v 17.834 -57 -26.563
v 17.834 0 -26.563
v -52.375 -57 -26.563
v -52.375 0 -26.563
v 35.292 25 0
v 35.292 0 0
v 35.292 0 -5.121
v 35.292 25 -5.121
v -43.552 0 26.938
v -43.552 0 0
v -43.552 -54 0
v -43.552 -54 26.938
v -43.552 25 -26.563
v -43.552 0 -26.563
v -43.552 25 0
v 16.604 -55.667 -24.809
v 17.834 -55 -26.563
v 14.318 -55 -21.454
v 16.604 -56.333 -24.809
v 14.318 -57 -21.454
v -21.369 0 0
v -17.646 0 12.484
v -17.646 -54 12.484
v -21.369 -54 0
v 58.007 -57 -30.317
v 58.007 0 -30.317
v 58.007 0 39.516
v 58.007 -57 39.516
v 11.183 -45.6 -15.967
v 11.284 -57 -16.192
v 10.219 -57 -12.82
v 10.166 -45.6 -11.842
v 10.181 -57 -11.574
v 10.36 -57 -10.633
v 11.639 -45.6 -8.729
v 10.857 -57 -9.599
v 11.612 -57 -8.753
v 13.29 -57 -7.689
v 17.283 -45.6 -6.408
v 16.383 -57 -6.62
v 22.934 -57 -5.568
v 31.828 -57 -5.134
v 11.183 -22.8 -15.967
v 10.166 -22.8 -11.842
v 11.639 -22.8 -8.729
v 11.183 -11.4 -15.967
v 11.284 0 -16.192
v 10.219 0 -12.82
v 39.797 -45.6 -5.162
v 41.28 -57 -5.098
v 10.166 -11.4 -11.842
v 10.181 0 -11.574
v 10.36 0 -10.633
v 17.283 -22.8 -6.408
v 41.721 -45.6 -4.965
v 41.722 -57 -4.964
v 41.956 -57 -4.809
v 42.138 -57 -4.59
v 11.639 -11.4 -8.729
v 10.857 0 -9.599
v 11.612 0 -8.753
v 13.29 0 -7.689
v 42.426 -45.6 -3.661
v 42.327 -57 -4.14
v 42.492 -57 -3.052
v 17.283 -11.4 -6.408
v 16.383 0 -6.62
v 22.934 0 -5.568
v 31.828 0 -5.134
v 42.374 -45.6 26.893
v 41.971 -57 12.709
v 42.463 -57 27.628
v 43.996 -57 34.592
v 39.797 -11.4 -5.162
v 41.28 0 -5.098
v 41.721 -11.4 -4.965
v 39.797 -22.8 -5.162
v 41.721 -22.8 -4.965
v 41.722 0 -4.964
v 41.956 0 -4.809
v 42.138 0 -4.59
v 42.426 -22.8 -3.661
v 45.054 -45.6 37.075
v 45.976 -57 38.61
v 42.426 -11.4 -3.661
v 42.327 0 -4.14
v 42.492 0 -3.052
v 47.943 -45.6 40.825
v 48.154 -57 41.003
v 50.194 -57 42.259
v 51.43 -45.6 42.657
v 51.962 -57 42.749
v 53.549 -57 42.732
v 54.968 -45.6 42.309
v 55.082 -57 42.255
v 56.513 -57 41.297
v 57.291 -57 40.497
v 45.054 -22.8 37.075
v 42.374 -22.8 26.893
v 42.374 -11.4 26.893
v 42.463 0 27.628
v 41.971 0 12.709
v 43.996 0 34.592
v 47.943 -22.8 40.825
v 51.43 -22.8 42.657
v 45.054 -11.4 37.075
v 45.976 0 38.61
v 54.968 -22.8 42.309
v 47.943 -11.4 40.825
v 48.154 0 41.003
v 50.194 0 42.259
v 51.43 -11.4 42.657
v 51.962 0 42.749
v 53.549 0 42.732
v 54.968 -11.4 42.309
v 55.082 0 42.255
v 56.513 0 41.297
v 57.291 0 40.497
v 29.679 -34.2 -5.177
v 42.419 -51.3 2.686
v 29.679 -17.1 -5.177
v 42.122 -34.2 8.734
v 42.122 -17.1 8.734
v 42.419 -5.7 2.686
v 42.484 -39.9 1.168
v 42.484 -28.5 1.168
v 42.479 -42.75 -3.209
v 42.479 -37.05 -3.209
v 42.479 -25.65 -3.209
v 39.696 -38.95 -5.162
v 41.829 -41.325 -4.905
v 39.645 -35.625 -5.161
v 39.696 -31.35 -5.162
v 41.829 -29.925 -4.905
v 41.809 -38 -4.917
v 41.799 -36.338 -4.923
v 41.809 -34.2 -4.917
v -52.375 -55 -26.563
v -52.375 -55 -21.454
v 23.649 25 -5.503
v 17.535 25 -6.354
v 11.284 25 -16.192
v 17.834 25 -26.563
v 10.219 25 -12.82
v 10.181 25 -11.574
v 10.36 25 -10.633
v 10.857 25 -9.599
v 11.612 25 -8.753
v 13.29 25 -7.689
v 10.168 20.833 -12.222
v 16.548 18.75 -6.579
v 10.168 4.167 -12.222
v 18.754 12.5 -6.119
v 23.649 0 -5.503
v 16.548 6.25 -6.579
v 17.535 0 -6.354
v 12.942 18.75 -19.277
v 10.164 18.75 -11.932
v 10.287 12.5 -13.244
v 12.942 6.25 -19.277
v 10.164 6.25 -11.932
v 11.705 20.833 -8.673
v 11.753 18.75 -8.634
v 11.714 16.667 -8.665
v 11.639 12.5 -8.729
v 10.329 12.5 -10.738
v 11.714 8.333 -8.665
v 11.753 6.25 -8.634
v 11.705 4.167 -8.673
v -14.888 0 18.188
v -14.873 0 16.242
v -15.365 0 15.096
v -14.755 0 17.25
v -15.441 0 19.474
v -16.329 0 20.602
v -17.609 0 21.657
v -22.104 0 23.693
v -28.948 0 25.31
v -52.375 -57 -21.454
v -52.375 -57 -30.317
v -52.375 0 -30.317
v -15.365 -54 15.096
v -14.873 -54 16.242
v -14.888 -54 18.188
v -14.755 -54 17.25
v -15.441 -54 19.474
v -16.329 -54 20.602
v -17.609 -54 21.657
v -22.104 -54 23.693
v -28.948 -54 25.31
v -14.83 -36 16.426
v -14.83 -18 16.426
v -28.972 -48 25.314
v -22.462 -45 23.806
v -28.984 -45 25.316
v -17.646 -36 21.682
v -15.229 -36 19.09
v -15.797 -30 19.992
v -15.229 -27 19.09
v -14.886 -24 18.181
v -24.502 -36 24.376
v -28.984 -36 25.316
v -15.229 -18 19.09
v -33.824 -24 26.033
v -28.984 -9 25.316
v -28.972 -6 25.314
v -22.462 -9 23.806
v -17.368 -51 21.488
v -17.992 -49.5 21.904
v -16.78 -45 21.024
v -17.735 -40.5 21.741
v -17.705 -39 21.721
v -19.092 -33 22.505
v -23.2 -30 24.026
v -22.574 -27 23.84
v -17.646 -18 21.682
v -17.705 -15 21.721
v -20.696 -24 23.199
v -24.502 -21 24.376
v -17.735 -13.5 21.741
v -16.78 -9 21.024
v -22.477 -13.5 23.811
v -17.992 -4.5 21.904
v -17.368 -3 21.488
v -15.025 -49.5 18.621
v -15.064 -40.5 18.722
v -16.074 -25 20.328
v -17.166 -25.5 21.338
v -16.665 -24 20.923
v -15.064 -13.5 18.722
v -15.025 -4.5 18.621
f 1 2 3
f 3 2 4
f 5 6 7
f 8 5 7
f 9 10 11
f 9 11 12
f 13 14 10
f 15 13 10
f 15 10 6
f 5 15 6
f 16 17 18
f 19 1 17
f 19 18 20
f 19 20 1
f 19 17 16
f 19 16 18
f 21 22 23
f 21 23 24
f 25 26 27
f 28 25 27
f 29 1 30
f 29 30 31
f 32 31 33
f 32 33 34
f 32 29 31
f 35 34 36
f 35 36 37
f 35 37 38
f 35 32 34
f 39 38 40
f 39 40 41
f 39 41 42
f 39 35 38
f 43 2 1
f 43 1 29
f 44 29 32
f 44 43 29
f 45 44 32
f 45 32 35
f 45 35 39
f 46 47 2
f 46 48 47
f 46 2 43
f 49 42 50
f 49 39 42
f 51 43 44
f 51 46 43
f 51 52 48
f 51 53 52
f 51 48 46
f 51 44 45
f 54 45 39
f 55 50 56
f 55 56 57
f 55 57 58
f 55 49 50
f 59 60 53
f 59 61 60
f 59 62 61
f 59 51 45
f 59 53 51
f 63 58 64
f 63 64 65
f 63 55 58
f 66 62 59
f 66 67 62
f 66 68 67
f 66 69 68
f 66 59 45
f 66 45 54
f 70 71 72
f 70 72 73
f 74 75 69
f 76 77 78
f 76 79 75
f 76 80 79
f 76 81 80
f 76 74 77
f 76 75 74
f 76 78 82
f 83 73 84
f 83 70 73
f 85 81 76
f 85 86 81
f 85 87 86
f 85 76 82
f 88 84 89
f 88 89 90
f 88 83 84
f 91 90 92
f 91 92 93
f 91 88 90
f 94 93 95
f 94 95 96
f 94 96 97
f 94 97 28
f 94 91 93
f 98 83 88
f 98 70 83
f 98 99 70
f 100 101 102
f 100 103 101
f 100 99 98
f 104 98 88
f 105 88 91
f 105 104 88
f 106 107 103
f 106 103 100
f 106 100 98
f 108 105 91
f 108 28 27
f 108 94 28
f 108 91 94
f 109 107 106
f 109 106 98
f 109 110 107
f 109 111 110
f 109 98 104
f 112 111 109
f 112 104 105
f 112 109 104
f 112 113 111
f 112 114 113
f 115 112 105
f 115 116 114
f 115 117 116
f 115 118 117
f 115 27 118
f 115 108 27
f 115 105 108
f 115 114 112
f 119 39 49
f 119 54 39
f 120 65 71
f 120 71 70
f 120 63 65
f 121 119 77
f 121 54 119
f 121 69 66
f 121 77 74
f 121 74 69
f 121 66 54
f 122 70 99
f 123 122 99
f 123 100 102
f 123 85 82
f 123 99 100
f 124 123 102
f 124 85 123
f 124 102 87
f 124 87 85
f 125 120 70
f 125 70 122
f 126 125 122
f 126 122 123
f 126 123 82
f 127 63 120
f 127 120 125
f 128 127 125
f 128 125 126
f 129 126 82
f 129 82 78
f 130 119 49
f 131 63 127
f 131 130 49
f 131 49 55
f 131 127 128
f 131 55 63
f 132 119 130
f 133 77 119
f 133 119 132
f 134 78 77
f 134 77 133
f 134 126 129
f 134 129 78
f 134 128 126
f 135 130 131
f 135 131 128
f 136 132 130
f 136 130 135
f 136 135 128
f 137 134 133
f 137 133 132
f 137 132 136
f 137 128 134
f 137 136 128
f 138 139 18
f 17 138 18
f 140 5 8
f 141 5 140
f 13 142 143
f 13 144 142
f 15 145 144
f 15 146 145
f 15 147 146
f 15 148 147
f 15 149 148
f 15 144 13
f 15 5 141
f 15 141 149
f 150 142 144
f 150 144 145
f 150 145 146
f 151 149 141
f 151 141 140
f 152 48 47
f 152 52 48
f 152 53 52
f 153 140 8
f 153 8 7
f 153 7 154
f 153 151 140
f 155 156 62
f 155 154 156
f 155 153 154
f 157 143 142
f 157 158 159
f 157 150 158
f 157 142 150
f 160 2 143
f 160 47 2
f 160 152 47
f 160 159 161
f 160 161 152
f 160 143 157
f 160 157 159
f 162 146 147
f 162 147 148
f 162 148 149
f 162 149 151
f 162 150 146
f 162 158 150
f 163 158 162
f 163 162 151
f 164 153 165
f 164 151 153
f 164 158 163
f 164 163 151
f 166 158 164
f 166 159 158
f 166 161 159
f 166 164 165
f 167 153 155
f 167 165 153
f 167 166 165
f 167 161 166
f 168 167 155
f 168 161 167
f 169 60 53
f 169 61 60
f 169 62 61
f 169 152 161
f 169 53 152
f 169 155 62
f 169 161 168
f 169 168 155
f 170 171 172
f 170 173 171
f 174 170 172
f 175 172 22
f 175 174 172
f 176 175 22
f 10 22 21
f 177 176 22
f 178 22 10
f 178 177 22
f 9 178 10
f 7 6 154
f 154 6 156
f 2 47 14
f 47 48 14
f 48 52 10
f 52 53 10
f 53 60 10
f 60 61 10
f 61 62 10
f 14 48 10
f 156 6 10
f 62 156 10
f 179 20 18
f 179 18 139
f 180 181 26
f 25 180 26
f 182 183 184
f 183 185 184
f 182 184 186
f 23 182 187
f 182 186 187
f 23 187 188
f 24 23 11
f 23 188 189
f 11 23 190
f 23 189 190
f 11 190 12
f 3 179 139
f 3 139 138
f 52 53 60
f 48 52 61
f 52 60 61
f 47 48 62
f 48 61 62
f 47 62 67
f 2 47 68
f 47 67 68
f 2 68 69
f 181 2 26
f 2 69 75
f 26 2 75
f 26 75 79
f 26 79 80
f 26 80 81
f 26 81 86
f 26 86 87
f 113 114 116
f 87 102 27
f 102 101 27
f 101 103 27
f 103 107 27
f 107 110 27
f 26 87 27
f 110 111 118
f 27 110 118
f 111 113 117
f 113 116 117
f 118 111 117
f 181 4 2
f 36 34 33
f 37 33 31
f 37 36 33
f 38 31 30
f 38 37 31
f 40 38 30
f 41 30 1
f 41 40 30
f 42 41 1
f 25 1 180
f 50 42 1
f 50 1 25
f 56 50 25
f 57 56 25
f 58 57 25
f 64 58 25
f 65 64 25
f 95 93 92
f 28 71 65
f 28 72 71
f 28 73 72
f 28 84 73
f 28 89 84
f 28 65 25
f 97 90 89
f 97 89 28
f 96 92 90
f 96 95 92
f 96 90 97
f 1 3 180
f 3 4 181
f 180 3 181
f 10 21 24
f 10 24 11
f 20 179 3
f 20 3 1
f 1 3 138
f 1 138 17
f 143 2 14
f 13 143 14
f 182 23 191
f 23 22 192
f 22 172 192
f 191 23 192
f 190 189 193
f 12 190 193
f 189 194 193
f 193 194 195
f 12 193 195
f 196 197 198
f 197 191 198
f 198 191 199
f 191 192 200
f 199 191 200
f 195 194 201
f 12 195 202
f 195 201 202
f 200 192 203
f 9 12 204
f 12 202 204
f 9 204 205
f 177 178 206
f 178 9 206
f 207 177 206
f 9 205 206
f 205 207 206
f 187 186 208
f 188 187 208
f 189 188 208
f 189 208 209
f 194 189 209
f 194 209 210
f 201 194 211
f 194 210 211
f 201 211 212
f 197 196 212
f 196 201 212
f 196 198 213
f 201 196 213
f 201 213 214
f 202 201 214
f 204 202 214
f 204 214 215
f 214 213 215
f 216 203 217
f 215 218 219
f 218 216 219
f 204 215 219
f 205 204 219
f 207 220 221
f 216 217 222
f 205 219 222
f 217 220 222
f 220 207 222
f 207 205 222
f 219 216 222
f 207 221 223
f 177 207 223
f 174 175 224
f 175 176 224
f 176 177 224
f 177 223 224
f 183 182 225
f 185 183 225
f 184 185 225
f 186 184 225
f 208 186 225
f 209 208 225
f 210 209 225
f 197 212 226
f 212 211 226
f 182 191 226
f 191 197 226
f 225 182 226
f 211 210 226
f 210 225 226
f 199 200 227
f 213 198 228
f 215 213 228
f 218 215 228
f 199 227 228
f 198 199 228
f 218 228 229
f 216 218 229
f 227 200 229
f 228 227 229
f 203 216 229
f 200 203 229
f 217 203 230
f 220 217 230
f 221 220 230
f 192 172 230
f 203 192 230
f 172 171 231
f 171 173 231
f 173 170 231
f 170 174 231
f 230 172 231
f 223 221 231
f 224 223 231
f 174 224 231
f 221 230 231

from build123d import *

# Parameters (mm, degrees)
F1_DEPTH = 57
F3_DEPTH = 25
F4_DEPTH = 54
F6_DEPTH = 2


with BuildPart() as f1:
    # F0 (on Front) → F1 (new body)
    with BuildSketch(Plane.XZ):
        with BuildLine():
            Line((-52.3748546839, -26.5628732741), (-52.3748546839, -30.3173419088))
            Line((-52.3748546839, -30.3173419088), (58.0065622926, -30.3173419088))
            Line((58.0065622926, -30.3173419088), (58.0065622926, 9.8554827273))
            Line((58.0065622926, 9.8554827273), (58.0065622926, 39.5157933235))
            add(Edge.make_bspline(
                [(17.8337320685, -26.5628732741), (12.2987850228, -18.6842330707), (2.0561256493, -4.0935398057), (39.9184715576, -5.3165841483), (44.2737718214, -4.953746865), (37.2323042761, 40.1599145958), (54.5306136351, 44.9857218694), (58.0065622926, 39.5157933235)],
                knots=[0, 0, 0, 0, 0.1616552234, 0.3598685336, 0.4245980156, 0.6623038598, 0.7973775563, 0.7973775563, 0.7973775563, 0.7973775563], degree=3))
            Line((17.8337320685, -26.5628732741), (-52.3748546839, -26.5628732741))
        make_face()
    extrude(amount=F1_DEPTH)


with BuildPart() as f3:
    # F2 (on face) → F3 (new body)
    with BuildSketch(Plane(origin=(0, 0, 0), x_dir=(-1, 0, 0), z_dir=(0, 1, 0))):
        with BuildLine():
            Line((-35.2920144796, 0), (-35.2920144796, -5.1211647892))
            add(Edge.make_bspline(
                [(-17.8337320685, -26.5628732741), (-12.2987850228, -18.6842330707), (-3.158691971, -5.6641482207), (-27.7282411082, -5.0880441426), (-35.2920144796, -5.1211647892)],
                knots=[0, 0, 0, 0, 0.1616552234, 0.321130652, 0.321130652, 0.321130652, 0.321130652], degree=3))
            Line((-17.8337320685, -26.5628732741), (43.551851064, -26.5628732741))
            Line((43.551851064, -26.5628732741), (43.551851064, 0))
            Line((43.551851064, 0), (21.3691905319, 0))
            Line((21.3691905319, 0), (-35.2920144796, 0))
        make_face()
    extrude(amount=F3_DEPTH)


with BuildPart() as f4:
    # F2 (on face) → F4 (new body)
    with BuildSketch(Plane(origin=(0, 0, 0), x_dir=(-1, 0, 0), z_dir=(0, 1, 0))):
        with BuildLine():
            Line((17.6460072398, 12.4836126342), (21.3691905319, 0))
            Line((21.3691905319, 0), (43.551851064, 0))
            Line((43.551851064, 0), (43.551851064, 26.9383192062))
            add(Edge.make_bspline(
                [(17.6460072398, 12.4836126342), (16.3933606924, 13.7029773667), (13.7509765364, 16.2751554931), (17.0166456197, 24.3596606637), (34.3061298742, 26.3135049454), (43.551851064, 26.9383192062)],
                knots=[0, 0, 0, 0, 0.1536034597, 0.3240174566, 0.6828172606, 0.6828172606, 0.6828172606, 0.6828172606], degree=3))
        make_face()
    extrude(amount=-F4_DEPTH)


with BuildPart() as f6:
    # F5 (on face) → F6 (new body)
    with BuildSketch(Plane.XZ.offset(57)):
        with BuildLine():
            Line((-52.3748546839, -21.4539207518), (-52.3748546839, -26.5628732741))
            Line((-52.3748546839, -26.5628732741), (17.8337320685, -26.5628732741))
            add(Edge.make_bspline(
                [(17.8337320685, -26.5628732741), (16.5850717017, -24.7854857606), (15.3839396707, -23.0755019333), (14.317689771, -21.4539207518)],
                knots=[0, 0, 0, 0, 0.0364687266, 0.0364687266, 0.0364687266, 0.0364687266], degree=3))
            Line((14.317689771, -21.4539207518), (-52.3748546839, -21.4539207518))
        make_face()
    extrude(amount=-F6_DEPTH)


solid = Compound([f1.part, f3.part, f4.part, f6.part])
